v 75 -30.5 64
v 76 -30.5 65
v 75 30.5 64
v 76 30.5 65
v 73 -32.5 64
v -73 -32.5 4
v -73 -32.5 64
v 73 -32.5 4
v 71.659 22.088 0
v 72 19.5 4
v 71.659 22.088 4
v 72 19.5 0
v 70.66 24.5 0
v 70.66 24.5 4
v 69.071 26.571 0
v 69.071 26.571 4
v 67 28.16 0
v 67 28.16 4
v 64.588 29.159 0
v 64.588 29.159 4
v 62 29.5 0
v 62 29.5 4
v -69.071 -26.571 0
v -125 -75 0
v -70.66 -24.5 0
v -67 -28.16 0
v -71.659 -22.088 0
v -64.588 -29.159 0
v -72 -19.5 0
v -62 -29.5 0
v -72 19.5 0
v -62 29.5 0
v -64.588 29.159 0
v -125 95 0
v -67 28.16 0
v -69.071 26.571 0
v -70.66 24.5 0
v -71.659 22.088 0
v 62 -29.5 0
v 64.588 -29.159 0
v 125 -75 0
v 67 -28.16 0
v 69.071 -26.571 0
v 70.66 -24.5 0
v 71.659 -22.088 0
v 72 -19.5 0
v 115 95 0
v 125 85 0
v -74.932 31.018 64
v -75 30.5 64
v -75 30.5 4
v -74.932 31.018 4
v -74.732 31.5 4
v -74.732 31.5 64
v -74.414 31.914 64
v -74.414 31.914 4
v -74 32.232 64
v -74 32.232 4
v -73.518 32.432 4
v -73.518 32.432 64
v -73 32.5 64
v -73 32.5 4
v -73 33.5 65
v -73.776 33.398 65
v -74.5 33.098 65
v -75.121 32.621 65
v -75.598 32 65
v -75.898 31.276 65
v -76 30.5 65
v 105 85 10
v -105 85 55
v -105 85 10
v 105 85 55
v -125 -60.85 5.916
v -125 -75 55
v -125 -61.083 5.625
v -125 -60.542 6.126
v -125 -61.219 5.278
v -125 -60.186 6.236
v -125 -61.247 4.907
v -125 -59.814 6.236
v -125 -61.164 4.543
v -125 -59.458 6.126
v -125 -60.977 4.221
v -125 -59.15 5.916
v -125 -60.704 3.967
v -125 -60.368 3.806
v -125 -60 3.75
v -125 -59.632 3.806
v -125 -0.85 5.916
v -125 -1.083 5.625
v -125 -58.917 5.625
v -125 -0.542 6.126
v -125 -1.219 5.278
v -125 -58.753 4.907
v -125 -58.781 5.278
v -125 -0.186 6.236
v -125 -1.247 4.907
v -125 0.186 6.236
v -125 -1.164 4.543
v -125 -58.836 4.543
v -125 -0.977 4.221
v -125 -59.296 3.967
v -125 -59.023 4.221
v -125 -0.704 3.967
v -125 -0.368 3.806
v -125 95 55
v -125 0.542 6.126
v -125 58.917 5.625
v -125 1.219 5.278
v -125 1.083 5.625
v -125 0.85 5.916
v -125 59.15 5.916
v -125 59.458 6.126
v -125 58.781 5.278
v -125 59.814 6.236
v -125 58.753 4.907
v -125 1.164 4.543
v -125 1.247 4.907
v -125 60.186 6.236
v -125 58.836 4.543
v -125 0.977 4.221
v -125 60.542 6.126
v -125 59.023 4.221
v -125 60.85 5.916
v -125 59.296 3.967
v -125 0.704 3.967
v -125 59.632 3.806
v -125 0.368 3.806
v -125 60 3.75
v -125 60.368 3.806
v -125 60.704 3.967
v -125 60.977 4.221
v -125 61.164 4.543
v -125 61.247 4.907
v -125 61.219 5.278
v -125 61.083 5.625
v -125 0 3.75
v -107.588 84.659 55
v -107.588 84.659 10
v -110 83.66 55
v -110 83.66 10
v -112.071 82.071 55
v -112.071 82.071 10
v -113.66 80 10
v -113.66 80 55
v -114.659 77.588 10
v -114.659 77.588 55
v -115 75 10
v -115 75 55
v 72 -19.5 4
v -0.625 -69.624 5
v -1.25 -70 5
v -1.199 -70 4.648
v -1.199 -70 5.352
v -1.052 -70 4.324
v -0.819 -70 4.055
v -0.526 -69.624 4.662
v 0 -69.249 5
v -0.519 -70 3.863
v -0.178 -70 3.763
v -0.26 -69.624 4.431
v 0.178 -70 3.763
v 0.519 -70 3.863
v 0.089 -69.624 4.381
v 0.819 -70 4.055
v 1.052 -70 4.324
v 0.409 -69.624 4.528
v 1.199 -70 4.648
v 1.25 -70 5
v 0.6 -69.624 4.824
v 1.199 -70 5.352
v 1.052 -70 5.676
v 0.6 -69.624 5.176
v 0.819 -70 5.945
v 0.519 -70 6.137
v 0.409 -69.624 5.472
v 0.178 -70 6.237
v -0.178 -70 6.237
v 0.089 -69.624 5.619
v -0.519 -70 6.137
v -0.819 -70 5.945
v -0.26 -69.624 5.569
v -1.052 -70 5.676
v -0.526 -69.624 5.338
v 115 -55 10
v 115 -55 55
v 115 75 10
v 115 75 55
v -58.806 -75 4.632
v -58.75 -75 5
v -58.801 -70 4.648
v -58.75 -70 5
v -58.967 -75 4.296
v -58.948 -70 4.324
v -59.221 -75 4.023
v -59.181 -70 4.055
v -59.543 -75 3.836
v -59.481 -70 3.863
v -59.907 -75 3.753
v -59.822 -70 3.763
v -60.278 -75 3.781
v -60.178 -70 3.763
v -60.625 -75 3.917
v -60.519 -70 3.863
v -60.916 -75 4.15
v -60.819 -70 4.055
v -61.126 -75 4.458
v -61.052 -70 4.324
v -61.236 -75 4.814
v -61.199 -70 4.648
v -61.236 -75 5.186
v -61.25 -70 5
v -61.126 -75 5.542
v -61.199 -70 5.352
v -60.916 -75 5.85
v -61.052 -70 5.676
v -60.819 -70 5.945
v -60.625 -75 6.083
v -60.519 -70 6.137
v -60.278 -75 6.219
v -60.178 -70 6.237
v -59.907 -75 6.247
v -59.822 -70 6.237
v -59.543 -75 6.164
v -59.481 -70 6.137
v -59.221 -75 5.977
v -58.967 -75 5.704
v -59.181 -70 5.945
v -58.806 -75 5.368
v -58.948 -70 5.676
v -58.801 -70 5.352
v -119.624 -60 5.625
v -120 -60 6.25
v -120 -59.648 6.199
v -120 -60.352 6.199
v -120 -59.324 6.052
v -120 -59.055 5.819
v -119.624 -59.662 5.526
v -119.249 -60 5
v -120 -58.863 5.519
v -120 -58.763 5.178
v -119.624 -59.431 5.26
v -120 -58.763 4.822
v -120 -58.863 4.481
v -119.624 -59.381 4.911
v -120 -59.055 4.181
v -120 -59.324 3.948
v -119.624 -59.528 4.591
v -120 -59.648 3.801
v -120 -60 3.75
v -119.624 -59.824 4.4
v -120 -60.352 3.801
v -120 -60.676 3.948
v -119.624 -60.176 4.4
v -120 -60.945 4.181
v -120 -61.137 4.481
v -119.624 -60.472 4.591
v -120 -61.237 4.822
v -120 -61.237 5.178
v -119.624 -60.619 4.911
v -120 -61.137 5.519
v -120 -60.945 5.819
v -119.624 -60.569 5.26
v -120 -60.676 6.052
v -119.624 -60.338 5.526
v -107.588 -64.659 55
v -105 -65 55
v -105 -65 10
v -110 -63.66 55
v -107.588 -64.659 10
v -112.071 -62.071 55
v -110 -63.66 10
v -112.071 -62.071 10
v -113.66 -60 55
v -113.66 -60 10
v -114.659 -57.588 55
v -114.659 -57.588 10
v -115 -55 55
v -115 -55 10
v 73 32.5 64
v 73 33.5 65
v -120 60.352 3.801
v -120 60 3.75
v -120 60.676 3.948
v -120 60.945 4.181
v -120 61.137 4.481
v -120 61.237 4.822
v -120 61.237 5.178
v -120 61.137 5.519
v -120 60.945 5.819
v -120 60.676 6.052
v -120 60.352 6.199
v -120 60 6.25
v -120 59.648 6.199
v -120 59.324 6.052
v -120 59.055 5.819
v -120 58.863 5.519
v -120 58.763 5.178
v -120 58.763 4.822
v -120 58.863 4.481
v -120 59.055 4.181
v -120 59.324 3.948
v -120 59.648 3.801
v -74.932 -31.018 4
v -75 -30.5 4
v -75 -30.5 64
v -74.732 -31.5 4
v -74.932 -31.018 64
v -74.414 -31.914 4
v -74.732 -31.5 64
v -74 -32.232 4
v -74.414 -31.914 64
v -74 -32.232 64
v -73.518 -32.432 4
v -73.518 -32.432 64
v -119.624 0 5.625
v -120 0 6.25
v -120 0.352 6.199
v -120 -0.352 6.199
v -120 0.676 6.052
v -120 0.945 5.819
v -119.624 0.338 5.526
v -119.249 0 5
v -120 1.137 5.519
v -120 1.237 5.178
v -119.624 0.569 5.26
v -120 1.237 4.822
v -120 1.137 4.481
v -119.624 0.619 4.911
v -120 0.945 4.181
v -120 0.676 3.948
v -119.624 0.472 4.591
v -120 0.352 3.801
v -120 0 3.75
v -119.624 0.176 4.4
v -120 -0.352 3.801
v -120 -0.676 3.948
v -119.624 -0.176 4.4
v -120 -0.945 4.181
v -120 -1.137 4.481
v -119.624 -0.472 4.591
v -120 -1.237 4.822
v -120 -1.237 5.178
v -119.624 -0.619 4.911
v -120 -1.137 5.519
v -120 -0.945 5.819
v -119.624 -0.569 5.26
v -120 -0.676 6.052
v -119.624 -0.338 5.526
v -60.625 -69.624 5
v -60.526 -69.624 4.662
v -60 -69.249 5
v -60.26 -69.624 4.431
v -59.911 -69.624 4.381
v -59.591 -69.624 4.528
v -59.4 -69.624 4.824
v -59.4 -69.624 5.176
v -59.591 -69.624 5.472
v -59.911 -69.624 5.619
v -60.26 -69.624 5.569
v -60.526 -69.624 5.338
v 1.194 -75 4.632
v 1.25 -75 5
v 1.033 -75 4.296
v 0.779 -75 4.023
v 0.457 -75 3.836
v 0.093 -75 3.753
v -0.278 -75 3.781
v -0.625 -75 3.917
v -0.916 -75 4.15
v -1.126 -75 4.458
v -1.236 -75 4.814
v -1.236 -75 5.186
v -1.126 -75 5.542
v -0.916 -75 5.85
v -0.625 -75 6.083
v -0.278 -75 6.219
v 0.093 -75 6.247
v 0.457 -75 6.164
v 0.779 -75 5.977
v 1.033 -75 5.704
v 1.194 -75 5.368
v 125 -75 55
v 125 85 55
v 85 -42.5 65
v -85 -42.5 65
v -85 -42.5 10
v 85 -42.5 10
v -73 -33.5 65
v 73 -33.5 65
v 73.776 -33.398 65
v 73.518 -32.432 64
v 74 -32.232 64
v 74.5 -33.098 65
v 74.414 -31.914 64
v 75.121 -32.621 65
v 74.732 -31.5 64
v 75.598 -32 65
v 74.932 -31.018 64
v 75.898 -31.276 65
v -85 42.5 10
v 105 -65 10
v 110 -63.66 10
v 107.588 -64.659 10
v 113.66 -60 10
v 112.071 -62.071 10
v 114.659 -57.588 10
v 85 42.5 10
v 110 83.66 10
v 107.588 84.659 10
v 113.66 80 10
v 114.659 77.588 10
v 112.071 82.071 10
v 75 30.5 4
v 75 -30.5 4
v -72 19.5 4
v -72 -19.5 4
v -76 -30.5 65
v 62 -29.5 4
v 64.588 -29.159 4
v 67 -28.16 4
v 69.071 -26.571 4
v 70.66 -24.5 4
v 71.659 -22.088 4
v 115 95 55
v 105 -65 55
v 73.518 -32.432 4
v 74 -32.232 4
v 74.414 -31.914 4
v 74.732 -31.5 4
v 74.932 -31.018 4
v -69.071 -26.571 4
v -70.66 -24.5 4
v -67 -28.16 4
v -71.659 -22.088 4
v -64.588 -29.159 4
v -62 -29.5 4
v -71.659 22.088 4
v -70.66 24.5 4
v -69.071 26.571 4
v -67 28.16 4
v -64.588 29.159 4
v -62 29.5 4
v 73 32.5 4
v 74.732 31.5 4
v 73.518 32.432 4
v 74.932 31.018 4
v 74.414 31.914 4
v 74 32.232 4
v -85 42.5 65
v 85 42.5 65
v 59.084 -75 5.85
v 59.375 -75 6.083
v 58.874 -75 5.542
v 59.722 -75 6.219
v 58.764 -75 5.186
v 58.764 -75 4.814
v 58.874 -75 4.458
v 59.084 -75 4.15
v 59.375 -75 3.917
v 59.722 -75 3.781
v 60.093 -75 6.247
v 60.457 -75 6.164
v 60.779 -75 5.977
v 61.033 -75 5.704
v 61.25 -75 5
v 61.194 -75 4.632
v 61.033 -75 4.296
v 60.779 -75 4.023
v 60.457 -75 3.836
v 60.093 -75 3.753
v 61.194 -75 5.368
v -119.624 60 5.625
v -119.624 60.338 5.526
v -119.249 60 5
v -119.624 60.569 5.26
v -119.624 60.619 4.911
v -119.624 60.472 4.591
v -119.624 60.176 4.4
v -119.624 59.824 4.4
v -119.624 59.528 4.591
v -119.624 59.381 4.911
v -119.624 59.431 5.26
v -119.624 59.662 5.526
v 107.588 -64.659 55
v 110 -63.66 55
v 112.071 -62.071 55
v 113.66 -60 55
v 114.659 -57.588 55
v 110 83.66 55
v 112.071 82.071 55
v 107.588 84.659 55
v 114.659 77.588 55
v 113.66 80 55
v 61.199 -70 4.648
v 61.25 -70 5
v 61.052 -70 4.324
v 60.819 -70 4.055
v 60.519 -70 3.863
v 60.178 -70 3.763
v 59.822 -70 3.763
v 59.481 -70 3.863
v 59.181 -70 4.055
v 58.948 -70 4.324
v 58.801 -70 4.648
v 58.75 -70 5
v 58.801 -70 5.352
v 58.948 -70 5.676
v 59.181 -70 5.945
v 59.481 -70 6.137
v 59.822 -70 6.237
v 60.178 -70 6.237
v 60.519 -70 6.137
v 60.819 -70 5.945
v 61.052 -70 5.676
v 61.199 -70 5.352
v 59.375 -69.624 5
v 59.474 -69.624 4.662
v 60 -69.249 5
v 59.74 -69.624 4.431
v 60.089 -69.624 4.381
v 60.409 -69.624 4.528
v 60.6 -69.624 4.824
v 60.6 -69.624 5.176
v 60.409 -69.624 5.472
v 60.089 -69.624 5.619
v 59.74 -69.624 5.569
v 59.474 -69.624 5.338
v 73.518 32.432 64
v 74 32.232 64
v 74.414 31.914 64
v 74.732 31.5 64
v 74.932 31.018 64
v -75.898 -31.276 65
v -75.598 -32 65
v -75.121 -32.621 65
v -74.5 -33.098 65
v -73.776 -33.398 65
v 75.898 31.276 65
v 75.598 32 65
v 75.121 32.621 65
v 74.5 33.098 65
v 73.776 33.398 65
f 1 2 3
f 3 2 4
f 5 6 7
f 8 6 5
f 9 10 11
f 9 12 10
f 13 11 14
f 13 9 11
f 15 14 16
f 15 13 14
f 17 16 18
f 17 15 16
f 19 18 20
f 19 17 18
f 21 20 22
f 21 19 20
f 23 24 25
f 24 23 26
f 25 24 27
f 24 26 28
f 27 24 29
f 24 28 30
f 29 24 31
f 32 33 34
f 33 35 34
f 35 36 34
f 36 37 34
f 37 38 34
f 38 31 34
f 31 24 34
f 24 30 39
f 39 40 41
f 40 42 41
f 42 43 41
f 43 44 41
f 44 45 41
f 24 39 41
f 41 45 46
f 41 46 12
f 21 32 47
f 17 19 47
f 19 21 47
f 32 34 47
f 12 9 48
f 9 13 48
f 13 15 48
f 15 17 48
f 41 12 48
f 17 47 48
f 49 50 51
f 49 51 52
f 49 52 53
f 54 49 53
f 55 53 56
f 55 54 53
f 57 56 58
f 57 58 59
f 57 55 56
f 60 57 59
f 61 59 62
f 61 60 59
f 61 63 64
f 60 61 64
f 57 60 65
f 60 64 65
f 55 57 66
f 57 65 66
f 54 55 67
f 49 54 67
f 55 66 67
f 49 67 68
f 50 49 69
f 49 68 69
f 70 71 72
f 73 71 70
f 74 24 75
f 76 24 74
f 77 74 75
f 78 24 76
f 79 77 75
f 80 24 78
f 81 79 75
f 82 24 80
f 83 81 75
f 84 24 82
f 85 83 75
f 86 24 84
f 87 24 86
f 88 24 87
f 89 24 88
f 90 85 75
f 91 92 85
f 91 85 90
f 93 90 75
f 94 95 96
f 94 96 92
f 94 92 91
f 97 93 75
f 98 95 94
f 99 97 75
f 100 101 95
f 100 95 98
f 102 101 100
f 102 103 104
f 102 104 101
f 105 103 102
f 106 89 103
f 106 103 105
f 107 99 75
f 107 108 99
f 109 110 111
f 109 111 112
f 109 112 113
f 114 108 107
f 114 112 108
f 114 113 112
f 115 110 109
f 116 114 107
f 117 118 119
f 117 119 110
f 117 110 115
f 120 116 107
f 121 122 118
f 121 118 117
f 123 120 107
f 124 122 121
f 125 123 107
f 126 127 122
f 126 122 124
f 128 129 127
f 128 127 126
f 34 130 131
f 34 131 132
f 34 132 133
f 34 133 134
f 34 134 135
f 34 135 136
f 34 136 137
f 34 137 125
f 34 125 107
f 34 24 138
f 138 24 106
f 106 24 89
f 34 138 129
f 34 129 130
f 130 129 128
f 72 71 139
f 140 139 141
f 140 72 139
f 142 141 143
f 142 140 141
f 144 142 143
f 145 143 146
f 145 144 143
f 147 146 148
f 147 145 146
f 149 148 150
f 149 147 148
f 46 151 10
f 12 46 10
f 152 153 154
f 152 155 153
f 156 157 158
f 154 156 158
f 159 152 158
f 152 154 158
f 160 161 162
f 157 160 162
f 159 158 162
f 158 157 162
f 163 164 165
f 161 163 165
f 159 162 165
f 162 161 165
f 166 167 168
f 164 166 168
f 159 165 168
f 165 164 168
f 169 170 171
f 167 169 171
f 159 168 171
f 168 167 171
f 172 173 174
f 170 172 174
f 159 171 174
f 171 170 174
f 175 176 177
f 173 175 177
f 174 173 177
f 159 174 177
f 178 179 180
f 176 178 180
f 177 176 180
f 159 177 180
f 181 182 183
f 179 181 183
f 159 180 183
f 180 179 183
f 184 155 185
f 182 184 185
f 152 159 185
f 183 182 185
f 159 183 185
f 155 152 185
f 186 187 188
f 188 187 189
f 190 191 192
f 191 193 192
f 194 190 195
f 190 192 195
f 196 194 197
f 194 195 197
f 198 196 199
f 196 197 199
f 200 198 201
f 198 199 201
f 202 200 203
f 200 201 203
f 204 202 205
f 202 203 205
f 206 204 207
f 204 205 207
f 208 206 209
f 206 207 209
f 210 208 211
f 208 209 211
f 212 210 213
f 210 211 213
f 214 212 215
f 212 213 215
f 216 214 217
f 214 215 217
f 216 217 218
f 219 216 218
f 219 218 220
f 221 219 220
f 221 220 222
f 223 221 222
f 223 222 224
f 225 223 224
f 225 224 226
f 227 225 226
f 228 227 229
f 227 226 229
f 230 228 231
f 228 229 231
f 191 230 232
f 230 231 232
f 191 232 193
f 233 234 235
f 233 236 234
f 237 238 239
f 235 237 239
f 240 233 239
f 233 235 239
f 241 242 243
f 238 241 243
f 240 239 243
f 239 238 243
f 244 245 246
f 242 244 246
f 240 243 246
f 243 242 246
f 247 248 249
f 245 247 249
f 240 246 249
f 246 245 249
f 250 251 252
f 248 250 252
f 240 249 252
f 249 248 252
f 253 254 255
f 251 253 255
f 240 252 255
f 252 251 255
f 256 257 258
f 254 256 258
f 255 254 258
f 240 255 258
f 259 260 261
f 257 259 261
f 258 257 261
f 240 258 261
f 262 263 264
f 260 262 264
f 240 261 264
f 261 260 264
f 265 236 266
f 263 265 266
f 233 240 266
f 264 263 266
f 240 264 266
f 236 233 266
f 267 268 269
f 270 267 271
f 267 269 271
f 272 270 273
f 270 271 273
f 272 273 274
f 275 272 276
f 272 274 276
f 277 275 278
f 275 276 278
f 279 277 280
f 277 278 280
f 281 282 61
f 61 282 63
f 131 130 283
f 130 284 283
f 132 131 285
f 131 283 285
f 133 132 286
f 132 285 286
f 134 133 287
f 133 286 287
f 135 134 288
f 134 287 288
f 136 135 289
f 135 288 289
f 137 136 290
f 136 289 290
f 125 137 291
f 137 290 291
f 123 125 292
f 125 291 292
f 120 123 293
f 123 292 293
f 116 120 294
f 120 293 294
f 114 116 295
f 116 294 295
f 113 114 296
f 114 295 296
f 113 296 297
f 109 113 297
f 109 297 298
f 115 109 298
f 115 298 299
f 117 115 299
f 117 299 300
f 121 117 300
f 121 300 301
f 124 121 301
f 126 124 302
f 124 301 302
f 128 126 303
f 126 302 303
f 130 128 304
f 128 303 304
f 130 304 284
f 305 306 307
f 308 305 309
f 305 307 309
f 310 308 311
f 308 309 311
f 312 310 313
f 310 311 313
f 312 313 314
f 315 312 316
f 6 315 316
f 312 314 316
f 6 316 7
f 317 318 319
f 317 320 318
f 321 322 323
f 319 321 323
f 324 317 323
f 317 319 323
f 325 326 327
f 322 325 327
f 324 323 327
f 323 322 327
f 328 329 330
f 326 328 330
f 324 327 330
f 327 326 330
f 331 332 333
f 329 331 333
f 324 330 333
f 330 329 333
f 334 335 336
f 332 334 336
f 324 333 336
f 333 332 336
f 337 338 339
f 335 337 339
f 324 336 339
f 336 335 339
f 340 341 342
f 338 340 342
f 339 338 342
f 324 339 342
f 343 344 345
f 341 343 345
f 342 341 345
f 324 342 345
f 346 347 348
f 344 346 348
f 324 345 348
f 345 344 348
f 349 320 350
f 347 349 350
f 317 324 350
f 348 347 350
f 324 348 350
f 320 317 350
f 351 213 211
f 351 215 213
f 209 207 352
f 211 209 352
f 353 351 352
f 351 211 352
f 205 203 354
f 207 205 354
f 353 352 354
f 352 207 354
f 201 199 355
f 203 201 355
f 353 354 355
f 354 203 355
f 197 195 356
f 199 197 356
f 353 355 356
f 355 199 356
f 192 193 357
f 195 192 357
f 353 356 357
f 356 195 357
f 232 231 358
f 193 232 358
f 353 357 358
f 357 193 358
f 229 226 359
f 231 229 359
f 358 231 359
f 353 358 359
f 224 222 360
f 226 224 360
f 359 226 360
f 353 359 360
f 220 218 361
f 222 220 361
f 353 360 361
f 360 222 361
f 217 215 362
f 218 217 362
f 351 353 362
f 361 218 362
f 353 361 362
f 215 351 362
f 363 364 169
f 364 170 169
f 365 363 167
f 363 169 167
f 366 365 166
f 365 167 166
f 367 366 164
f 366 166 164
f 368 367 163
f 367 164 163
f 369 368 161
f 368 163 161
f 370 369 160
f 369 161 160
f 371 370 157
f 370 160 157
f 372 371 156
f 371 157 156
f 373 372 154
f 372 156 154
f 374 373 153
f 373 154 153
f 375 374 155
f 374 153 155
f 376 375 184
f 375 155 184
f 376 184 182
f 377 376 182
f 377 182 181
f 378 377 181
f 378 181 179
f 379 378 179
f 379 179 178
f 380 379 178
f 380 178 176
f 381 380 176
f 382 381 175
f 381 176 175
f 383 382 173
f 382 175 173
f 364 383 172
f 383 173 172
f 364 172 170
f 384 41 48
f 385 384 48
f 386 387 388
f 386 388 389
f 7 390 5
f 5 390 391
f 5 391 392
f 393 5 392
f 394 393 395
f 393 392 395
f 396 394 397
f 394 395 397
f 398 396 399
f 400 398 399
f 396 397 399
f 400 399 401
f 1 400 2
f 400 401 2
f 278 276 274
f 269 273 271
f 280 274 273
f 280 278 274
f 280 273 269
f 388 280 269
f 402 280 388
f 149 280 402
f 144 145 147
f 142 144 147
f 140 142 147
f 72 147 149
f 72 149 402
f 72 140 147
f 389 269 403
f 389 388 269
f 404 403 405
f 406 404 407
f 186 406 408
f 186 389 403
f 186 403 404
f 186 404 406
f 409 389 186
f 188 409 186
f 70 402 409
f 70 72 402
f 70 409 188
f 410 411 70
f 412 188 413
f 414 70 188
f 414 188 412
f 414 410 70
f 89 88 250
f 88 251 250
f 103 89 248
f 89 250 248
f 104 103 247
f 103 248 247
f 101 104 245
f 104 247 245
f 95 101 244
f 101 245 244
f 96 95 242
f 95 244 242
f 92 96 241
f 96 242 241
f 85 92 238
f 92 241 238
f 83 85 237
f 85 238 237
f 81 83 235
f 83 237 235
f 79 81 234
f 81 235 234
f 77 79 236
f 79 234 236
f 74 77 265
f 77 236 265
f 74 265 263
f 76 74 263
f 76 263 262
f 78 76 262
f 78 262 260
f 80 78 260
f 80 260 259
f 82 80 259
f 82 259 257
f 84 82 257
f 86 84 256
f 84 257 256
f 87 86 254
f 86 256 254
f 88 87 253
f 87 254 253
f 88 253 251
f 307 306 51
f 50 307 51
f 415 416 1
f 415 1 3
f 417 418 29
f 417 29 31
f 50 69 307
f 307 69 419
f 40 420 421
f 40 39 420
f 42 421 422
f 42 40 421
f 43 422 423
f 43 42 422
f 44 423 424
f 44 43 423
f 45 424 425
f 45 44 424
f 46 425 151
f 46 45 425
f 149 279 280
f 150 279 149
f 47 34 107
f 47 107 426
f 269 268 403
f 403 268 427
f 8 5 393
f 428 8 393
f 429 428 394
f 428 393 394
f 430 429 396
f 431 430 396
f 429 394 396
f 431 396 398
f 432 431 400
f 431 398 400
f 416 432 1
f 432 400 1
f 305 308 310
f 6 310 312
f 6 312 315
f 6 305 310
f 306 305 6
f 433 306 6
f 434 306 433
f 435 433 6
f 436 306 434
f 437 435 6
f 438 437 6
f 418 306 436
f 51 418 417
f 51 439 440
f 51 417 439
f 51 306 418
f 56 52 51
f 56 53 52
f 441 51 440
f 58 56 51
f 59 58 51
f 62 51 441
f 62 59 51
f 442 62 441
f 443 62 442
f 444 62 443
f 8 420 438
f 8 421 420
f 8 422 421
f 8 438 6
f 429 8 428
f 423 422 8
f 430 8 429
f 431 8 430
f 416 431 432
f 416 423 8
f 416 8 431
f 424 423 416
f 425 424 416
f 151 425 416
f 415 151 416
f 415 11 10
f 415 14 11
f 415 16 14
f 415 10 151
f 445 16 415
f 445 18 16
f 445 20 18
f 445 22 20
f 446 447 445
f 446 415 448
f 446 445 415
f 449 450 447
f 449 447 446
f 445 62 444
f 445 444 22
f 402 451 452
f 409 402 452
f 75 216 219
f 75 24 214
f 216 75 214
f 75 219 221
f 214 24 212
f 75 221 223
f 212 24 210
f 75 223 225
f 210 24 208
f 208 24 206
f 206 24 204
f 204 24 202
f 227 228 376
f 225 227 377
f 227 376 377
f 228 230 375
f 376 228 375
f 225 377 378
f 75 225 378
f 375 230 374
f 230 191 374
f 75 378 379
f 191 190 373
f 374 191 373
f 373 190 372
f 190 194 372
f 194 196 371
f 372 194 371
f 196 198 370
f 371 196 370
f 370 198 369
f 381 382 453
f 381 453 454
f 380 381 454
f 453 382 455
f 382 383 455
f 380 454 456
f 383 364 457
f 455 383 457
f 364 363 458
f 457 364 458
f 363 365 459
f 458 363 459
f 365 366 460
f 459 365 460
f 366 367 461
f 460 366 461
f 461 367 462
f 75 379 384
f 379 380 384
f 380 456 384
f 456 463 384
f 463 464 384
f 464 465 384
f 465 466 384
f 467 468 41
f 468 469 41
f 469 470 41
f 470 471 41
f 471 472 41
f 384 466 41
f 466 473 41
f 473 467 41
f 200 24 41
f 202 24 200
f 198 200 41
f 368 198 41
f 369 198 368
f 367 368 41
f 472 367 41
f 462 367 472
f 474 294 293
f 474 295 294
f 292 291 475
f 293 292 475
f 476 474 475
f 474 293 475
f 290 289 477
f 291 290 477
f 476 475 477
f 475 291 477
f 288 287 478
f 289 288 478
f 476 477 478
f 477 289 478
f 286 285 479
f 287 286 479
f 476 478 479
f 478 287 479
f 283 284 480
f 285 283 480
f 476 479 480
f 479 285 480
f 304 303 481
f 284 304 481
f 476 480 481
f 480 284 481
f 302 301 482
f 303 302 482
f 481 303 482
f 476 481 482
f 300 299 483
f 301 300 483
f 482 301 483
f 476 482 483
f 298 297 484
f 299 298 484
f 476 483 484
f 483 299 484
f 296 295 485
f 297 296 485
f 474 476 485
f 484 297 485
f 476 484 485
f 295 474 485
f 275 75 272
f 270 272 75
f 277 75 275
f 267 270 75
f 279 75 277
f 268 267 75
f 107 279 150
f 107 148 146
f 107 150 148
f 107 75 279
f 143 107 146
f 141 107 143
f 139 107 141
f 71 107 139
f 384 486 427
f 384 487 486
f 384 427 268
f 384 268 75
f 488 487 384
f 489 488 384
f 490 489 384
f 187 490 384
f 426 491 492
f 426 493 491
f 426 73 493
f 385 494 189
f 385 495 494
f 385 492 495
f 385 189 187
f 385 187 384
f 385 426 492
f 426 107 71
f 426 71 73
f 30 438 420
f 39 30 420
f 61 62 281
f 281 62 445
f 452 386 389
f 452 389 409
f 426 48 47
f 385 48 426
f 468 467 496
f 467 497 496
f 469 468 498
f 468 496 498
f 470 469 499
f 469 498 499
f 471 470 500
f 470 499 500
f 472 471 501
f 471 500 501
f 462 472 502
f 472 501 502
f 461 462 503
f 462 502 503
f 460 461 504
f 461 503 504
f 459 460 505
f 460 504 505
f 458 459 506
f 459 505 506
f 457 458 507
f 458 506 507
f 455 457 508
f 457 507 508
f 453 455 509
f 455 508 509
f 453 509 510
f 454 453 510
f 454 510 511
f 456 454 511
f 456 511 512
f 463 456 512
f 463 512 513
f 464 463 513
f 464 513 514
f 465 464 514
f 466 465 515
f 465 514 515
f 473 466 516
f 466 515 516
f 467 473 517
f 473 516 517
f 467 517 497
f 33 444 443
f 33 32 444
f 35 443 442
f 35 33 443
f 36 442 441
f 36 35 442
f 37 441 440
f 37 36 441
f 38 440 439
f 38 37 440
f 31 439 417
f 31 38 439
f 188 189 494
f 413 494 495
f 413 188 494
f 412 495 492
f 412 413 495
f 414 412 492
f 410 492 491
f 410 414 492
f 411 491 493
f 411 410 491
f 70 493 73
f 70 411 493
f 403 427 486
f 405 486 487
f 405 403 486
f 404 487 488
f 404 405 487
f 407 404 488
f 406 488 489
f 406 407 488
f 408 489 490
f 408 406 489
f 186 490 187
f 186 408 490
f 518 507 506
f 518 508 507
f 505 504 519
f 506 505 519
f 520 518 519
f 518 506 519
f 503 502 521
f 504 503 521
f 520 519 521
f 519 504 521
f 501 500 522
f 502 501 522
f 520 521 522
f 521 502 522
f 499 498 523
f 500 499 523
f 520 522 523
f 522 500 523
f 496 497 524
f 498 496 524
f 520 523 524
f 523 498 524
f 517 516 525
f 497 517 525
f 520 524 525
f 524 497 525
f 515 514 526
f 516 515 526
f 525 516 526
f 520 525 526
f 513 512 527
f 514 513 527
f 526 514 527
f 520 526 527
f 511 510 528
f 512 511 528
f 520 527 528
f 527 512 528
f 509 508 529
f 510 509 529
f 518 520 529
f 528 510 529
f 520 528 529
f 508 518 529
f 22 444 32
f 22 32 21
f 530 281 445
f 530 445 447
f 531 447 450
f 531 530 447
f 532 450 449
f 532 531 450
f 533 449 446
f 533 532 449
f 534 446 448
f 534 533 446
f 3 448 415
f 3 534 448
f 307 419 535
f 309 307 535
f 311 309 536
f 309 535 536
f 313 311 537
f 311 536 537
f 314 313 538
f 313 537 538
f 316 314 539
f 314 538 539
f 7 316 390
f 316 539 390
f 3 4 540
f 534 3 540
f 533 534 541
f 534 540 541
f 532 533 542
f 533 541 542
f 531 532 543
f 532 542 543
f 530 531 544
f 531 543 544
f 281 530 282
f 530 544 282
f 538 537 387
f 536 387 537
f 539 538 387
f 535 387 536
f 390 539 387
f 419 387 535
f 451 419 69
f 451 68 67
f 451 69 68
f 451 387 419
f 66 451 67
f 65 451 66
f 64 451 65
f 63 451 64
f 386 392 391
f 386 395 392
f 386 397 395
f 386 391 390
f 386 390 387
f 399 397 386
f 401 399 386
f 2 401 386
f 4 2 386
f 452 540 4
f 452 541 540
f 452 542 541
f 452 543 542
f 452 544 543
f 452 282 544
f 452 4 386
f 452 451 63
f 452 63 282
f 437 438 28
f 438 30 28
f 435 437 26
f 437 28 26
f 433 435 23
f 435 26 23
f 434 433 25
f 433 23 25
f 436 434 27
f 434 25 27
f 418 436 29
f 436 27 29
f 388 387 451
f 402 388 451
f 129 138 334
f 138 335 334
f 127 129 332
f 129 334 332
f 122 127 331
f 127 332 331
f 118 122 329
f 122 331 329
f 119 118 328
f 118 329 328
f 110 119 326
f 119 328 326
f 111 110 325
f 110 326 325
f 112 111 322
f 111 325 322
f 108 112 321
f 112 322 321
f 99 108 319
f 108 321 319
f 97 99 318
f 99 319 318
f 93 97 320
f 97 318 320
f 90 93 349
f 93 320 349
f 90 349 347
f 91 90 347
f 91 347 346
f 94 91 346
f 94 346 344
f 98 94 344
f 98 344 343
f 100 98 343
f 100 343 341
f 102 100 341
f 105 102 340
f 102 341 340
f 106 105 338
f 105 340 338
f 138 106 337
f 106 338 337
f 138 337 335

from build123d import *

# Parameters (mm, degrees)
SKETCH1_W                   = 250
SKETCH1_H                   = 170
BOSS_EXTRUDE3_DEPTH         = 65
CUT_EXTRUDE1_START          = 4
SKETCH1_3_W                 = 150
SKETCH1_3_H                 = 65
CUT_EXTRUDE1_DEPTH          = 166.92645468
SKETCH6_W                   = 230
SKETCH6_H                   = 150
SKETCH6_W_2                 = 170
SKETCH6_H_2                 = 85
CUT_EXTRUDE2_DEPTH          = 55
SKETCH7_W                   = 144
SKETCH7_H                   = 59
CUT_EXTRUDE3_DEPTH          = 169.436931817
TAP_DRILL_FOR_M3_TAP1_D     = 2.5
TAP_DRILL_FOR_M3_TAP1_DEPTH = 5
TAP_DRILL_FOR_M3_TAP1_TIP   = 0.751075774
TAP_DRILL_FOR_M3_TAP3_D     = 2.5
TAP_DRILL_FOR_M3_TAP3_DEPTH = 5
TAP_DRILL_FOR_M3_TAP3_TIP   = 0.751075774
FILLET3_R                   = 10
CUT_EXTRUDE4_START          = -10
SKETCH19_W                  = 250
SKETCH19_H                  = 170
CUT_EXTRUDE4_DEPTH          = 10
FILLET2_R                   = 2
CHAMFER1_SIZE               = 1
CHAMFER2_SIZE               = 10


with BuildPart() as part:
    # Sketch1 → Boss-Extrude3 (new body)
    with BuildSketch(Plane.XY):
        with Locations((0, 10)):
            Rectangle(SKETCH1_W, SKETCH1_H)
    extrude(amount=BOSS_EXTRUDE3_DEPTH)

    # Sketch1<3> → Cut-Extrude1 (cut, through all)
    with BuildSketch(Plane.XY.offset(CUT_EXTRUDE1_START)):
        Rectangle(SKETCH1_3_W, SKETCH1_3_H)
    extrude(amount=CUT_EXTRUDE1_DEPTH, mode=Mode.SUBTRACT)

    # Sketch6 → Cut-Extrude2 (cut)
    with BuildSketch(Plane.XY.offset(65)):
        with Locations((0, 10)):
            Rectangle(SKETCH6_W, SKETCH6_H)
        Rectangle(SKETCH6_W_2, SKETCH6_H_2, mode=Mode.SUBTRACT)
    extrude(amount=-CUT_EXTRUDE2_DEPTH, mode=Mode.SUBTRACT)

    # Sketch7 → Cut-Extrude3 (cut, through all)
    with BuildSketch(Plane.XY.offset(4)):
        Rectangle(SKETCH7_W, SKETCH7_H)
    extrude(amount=-CUT_EXTRUDE3_DEPTH, mode=Mode.SUBTRACT)

    # Tap Drill for M3 Tap1
    with Locations(Plane(origin=(0, -75, 0), x_dir=(-1, 0, 0), z_dir=(0, -1, 0))):
        with Locations((-60, -5), (0, -5), (60, -5)):
            Hole(TAP_DRILL_FOR_M3_TAP1_D / 2, depth=TAP_DRILL_FOR_M3_TAP1_DEPTH)
            with Locations((0, 0, -(TAP_DRILL_FOR_M3_TAP1_DEPTH + TAP_DRILL_FOR_M3_TAP1_TIP / 2))):  # 118° drill point
                Cone(0, TAP_DRILL_FOR_M3_TAP1_D / 2, TAP_DRILL_FOR_M3_TAP1_TIP, mode=Mode.SUBTRACT)

    # Tap Drill for M3 Tap3
    with Locations(Plane.ZY.offset(125)):
        with Locations((5, 60), (5, 0), (5, -60)):
            Hole(TAP_DRILL_FOR_M3_TAP3_D / 2, depth=TAP_DRILL_FOR_M3_TAP3_DEPTH)
            with Locations((0, 0, -(TAP_DRILL_FOR_M3_TAP3_DEPTH + TAP_DRILL_FOR_M3_TAP3_TIP / 2))):  # 118° drill point
                Cone(0, TAP_DRILL_FOR_M3_TAP3_D / 2, TAP_DRILL_FOR_M3_TAP3_TIP, mode=Mode.SUBTRACT)

    # Fillet3
    fillet3_edges = [part.edges().sort_by_distance(p)[0] for p in [
        (115, -65, 37.5),
        (115, 85, 37.5),
        (-115, 85, 37.5),
        (-115, -65, 37.5),
        (-72, -29.5, 2),
        (-72, 29.5, 2),
        (72, 29.5, 2),
        (72, -29.5, 2),
    ]]
    fillet(fillet3_edges, radius=FILLET3_R)

    # Sketch19 → Cut-Extrude4 (cut)
    with BuildSketch(Plane.XY.offset(65).offset(CUT_EXTRUDE4_START)):
        with Locations((0, 10)):
            Rectangle(SKETCH19_W, SKETCH19_H)
        with BuildLine():
            Line((-115, 75), (-115, -55))
            ThreePointArc((-115, -55), (-112.071067812, -62.071067812), (-105, -65))
            Line((-105, -65), (105, -65))
            ThreePointArc((105, -65), (112.071067812, -62.071067812), (115, -55))
            Line((115, -55), (115, 75))
            ThreePointArc((115, 75), (112.071067812, 82.071067812), (105, 85))
            Line((105, 85), (-105, 85))
            ThreePointArc((-105, 85), (-112.071067812, 82.071067812), (-115, 75))
        make_face(mode=Mode.SUBTRACT)
    extrude(amount=CUT_EXTRUDE4_DEPTH, mode=Mode.SUBTRACT)

    # Fillet2
    fillet2_edges = [part.edges().sort_by_distance(p)[0] for p in [
        (-75, 32.5, 34.5),
        (-75, -32.5, 34.5),
        (75, -32.5, 34.5),
        (75, 32.5, 34.5),
    ]]
    fillet(fillet2_edges, radius=FILLET2_R)

    # Chamfer1
    chamfer1_edges = [part.edges().sort_by_distance(p)[0] for p in [
        (-75, 0, 65),
        (0, -32.5, 65),
        (75, 0, 65),
        (0, 32.5, 65),
        (-74.414213562, -31.914213562, 65),
        (74.414213562, -31.914213562, 65),
        (74.414213562, 31.914213562, 65),
        (-74.414213562, 31.914213562, 65),
    ]]
    chamfer(chamfer1_edges, length=CHAMFER1_SIZE)

    # Chamfer2
    chamfer2_edges = [part.edges().sort_by_distance(p)[0] for p in [
        (125, 95, 27.5),
    ]]
    chamfer(chamfer2_edges, length=CHAMFER2_SIZE)


solid = part.part
